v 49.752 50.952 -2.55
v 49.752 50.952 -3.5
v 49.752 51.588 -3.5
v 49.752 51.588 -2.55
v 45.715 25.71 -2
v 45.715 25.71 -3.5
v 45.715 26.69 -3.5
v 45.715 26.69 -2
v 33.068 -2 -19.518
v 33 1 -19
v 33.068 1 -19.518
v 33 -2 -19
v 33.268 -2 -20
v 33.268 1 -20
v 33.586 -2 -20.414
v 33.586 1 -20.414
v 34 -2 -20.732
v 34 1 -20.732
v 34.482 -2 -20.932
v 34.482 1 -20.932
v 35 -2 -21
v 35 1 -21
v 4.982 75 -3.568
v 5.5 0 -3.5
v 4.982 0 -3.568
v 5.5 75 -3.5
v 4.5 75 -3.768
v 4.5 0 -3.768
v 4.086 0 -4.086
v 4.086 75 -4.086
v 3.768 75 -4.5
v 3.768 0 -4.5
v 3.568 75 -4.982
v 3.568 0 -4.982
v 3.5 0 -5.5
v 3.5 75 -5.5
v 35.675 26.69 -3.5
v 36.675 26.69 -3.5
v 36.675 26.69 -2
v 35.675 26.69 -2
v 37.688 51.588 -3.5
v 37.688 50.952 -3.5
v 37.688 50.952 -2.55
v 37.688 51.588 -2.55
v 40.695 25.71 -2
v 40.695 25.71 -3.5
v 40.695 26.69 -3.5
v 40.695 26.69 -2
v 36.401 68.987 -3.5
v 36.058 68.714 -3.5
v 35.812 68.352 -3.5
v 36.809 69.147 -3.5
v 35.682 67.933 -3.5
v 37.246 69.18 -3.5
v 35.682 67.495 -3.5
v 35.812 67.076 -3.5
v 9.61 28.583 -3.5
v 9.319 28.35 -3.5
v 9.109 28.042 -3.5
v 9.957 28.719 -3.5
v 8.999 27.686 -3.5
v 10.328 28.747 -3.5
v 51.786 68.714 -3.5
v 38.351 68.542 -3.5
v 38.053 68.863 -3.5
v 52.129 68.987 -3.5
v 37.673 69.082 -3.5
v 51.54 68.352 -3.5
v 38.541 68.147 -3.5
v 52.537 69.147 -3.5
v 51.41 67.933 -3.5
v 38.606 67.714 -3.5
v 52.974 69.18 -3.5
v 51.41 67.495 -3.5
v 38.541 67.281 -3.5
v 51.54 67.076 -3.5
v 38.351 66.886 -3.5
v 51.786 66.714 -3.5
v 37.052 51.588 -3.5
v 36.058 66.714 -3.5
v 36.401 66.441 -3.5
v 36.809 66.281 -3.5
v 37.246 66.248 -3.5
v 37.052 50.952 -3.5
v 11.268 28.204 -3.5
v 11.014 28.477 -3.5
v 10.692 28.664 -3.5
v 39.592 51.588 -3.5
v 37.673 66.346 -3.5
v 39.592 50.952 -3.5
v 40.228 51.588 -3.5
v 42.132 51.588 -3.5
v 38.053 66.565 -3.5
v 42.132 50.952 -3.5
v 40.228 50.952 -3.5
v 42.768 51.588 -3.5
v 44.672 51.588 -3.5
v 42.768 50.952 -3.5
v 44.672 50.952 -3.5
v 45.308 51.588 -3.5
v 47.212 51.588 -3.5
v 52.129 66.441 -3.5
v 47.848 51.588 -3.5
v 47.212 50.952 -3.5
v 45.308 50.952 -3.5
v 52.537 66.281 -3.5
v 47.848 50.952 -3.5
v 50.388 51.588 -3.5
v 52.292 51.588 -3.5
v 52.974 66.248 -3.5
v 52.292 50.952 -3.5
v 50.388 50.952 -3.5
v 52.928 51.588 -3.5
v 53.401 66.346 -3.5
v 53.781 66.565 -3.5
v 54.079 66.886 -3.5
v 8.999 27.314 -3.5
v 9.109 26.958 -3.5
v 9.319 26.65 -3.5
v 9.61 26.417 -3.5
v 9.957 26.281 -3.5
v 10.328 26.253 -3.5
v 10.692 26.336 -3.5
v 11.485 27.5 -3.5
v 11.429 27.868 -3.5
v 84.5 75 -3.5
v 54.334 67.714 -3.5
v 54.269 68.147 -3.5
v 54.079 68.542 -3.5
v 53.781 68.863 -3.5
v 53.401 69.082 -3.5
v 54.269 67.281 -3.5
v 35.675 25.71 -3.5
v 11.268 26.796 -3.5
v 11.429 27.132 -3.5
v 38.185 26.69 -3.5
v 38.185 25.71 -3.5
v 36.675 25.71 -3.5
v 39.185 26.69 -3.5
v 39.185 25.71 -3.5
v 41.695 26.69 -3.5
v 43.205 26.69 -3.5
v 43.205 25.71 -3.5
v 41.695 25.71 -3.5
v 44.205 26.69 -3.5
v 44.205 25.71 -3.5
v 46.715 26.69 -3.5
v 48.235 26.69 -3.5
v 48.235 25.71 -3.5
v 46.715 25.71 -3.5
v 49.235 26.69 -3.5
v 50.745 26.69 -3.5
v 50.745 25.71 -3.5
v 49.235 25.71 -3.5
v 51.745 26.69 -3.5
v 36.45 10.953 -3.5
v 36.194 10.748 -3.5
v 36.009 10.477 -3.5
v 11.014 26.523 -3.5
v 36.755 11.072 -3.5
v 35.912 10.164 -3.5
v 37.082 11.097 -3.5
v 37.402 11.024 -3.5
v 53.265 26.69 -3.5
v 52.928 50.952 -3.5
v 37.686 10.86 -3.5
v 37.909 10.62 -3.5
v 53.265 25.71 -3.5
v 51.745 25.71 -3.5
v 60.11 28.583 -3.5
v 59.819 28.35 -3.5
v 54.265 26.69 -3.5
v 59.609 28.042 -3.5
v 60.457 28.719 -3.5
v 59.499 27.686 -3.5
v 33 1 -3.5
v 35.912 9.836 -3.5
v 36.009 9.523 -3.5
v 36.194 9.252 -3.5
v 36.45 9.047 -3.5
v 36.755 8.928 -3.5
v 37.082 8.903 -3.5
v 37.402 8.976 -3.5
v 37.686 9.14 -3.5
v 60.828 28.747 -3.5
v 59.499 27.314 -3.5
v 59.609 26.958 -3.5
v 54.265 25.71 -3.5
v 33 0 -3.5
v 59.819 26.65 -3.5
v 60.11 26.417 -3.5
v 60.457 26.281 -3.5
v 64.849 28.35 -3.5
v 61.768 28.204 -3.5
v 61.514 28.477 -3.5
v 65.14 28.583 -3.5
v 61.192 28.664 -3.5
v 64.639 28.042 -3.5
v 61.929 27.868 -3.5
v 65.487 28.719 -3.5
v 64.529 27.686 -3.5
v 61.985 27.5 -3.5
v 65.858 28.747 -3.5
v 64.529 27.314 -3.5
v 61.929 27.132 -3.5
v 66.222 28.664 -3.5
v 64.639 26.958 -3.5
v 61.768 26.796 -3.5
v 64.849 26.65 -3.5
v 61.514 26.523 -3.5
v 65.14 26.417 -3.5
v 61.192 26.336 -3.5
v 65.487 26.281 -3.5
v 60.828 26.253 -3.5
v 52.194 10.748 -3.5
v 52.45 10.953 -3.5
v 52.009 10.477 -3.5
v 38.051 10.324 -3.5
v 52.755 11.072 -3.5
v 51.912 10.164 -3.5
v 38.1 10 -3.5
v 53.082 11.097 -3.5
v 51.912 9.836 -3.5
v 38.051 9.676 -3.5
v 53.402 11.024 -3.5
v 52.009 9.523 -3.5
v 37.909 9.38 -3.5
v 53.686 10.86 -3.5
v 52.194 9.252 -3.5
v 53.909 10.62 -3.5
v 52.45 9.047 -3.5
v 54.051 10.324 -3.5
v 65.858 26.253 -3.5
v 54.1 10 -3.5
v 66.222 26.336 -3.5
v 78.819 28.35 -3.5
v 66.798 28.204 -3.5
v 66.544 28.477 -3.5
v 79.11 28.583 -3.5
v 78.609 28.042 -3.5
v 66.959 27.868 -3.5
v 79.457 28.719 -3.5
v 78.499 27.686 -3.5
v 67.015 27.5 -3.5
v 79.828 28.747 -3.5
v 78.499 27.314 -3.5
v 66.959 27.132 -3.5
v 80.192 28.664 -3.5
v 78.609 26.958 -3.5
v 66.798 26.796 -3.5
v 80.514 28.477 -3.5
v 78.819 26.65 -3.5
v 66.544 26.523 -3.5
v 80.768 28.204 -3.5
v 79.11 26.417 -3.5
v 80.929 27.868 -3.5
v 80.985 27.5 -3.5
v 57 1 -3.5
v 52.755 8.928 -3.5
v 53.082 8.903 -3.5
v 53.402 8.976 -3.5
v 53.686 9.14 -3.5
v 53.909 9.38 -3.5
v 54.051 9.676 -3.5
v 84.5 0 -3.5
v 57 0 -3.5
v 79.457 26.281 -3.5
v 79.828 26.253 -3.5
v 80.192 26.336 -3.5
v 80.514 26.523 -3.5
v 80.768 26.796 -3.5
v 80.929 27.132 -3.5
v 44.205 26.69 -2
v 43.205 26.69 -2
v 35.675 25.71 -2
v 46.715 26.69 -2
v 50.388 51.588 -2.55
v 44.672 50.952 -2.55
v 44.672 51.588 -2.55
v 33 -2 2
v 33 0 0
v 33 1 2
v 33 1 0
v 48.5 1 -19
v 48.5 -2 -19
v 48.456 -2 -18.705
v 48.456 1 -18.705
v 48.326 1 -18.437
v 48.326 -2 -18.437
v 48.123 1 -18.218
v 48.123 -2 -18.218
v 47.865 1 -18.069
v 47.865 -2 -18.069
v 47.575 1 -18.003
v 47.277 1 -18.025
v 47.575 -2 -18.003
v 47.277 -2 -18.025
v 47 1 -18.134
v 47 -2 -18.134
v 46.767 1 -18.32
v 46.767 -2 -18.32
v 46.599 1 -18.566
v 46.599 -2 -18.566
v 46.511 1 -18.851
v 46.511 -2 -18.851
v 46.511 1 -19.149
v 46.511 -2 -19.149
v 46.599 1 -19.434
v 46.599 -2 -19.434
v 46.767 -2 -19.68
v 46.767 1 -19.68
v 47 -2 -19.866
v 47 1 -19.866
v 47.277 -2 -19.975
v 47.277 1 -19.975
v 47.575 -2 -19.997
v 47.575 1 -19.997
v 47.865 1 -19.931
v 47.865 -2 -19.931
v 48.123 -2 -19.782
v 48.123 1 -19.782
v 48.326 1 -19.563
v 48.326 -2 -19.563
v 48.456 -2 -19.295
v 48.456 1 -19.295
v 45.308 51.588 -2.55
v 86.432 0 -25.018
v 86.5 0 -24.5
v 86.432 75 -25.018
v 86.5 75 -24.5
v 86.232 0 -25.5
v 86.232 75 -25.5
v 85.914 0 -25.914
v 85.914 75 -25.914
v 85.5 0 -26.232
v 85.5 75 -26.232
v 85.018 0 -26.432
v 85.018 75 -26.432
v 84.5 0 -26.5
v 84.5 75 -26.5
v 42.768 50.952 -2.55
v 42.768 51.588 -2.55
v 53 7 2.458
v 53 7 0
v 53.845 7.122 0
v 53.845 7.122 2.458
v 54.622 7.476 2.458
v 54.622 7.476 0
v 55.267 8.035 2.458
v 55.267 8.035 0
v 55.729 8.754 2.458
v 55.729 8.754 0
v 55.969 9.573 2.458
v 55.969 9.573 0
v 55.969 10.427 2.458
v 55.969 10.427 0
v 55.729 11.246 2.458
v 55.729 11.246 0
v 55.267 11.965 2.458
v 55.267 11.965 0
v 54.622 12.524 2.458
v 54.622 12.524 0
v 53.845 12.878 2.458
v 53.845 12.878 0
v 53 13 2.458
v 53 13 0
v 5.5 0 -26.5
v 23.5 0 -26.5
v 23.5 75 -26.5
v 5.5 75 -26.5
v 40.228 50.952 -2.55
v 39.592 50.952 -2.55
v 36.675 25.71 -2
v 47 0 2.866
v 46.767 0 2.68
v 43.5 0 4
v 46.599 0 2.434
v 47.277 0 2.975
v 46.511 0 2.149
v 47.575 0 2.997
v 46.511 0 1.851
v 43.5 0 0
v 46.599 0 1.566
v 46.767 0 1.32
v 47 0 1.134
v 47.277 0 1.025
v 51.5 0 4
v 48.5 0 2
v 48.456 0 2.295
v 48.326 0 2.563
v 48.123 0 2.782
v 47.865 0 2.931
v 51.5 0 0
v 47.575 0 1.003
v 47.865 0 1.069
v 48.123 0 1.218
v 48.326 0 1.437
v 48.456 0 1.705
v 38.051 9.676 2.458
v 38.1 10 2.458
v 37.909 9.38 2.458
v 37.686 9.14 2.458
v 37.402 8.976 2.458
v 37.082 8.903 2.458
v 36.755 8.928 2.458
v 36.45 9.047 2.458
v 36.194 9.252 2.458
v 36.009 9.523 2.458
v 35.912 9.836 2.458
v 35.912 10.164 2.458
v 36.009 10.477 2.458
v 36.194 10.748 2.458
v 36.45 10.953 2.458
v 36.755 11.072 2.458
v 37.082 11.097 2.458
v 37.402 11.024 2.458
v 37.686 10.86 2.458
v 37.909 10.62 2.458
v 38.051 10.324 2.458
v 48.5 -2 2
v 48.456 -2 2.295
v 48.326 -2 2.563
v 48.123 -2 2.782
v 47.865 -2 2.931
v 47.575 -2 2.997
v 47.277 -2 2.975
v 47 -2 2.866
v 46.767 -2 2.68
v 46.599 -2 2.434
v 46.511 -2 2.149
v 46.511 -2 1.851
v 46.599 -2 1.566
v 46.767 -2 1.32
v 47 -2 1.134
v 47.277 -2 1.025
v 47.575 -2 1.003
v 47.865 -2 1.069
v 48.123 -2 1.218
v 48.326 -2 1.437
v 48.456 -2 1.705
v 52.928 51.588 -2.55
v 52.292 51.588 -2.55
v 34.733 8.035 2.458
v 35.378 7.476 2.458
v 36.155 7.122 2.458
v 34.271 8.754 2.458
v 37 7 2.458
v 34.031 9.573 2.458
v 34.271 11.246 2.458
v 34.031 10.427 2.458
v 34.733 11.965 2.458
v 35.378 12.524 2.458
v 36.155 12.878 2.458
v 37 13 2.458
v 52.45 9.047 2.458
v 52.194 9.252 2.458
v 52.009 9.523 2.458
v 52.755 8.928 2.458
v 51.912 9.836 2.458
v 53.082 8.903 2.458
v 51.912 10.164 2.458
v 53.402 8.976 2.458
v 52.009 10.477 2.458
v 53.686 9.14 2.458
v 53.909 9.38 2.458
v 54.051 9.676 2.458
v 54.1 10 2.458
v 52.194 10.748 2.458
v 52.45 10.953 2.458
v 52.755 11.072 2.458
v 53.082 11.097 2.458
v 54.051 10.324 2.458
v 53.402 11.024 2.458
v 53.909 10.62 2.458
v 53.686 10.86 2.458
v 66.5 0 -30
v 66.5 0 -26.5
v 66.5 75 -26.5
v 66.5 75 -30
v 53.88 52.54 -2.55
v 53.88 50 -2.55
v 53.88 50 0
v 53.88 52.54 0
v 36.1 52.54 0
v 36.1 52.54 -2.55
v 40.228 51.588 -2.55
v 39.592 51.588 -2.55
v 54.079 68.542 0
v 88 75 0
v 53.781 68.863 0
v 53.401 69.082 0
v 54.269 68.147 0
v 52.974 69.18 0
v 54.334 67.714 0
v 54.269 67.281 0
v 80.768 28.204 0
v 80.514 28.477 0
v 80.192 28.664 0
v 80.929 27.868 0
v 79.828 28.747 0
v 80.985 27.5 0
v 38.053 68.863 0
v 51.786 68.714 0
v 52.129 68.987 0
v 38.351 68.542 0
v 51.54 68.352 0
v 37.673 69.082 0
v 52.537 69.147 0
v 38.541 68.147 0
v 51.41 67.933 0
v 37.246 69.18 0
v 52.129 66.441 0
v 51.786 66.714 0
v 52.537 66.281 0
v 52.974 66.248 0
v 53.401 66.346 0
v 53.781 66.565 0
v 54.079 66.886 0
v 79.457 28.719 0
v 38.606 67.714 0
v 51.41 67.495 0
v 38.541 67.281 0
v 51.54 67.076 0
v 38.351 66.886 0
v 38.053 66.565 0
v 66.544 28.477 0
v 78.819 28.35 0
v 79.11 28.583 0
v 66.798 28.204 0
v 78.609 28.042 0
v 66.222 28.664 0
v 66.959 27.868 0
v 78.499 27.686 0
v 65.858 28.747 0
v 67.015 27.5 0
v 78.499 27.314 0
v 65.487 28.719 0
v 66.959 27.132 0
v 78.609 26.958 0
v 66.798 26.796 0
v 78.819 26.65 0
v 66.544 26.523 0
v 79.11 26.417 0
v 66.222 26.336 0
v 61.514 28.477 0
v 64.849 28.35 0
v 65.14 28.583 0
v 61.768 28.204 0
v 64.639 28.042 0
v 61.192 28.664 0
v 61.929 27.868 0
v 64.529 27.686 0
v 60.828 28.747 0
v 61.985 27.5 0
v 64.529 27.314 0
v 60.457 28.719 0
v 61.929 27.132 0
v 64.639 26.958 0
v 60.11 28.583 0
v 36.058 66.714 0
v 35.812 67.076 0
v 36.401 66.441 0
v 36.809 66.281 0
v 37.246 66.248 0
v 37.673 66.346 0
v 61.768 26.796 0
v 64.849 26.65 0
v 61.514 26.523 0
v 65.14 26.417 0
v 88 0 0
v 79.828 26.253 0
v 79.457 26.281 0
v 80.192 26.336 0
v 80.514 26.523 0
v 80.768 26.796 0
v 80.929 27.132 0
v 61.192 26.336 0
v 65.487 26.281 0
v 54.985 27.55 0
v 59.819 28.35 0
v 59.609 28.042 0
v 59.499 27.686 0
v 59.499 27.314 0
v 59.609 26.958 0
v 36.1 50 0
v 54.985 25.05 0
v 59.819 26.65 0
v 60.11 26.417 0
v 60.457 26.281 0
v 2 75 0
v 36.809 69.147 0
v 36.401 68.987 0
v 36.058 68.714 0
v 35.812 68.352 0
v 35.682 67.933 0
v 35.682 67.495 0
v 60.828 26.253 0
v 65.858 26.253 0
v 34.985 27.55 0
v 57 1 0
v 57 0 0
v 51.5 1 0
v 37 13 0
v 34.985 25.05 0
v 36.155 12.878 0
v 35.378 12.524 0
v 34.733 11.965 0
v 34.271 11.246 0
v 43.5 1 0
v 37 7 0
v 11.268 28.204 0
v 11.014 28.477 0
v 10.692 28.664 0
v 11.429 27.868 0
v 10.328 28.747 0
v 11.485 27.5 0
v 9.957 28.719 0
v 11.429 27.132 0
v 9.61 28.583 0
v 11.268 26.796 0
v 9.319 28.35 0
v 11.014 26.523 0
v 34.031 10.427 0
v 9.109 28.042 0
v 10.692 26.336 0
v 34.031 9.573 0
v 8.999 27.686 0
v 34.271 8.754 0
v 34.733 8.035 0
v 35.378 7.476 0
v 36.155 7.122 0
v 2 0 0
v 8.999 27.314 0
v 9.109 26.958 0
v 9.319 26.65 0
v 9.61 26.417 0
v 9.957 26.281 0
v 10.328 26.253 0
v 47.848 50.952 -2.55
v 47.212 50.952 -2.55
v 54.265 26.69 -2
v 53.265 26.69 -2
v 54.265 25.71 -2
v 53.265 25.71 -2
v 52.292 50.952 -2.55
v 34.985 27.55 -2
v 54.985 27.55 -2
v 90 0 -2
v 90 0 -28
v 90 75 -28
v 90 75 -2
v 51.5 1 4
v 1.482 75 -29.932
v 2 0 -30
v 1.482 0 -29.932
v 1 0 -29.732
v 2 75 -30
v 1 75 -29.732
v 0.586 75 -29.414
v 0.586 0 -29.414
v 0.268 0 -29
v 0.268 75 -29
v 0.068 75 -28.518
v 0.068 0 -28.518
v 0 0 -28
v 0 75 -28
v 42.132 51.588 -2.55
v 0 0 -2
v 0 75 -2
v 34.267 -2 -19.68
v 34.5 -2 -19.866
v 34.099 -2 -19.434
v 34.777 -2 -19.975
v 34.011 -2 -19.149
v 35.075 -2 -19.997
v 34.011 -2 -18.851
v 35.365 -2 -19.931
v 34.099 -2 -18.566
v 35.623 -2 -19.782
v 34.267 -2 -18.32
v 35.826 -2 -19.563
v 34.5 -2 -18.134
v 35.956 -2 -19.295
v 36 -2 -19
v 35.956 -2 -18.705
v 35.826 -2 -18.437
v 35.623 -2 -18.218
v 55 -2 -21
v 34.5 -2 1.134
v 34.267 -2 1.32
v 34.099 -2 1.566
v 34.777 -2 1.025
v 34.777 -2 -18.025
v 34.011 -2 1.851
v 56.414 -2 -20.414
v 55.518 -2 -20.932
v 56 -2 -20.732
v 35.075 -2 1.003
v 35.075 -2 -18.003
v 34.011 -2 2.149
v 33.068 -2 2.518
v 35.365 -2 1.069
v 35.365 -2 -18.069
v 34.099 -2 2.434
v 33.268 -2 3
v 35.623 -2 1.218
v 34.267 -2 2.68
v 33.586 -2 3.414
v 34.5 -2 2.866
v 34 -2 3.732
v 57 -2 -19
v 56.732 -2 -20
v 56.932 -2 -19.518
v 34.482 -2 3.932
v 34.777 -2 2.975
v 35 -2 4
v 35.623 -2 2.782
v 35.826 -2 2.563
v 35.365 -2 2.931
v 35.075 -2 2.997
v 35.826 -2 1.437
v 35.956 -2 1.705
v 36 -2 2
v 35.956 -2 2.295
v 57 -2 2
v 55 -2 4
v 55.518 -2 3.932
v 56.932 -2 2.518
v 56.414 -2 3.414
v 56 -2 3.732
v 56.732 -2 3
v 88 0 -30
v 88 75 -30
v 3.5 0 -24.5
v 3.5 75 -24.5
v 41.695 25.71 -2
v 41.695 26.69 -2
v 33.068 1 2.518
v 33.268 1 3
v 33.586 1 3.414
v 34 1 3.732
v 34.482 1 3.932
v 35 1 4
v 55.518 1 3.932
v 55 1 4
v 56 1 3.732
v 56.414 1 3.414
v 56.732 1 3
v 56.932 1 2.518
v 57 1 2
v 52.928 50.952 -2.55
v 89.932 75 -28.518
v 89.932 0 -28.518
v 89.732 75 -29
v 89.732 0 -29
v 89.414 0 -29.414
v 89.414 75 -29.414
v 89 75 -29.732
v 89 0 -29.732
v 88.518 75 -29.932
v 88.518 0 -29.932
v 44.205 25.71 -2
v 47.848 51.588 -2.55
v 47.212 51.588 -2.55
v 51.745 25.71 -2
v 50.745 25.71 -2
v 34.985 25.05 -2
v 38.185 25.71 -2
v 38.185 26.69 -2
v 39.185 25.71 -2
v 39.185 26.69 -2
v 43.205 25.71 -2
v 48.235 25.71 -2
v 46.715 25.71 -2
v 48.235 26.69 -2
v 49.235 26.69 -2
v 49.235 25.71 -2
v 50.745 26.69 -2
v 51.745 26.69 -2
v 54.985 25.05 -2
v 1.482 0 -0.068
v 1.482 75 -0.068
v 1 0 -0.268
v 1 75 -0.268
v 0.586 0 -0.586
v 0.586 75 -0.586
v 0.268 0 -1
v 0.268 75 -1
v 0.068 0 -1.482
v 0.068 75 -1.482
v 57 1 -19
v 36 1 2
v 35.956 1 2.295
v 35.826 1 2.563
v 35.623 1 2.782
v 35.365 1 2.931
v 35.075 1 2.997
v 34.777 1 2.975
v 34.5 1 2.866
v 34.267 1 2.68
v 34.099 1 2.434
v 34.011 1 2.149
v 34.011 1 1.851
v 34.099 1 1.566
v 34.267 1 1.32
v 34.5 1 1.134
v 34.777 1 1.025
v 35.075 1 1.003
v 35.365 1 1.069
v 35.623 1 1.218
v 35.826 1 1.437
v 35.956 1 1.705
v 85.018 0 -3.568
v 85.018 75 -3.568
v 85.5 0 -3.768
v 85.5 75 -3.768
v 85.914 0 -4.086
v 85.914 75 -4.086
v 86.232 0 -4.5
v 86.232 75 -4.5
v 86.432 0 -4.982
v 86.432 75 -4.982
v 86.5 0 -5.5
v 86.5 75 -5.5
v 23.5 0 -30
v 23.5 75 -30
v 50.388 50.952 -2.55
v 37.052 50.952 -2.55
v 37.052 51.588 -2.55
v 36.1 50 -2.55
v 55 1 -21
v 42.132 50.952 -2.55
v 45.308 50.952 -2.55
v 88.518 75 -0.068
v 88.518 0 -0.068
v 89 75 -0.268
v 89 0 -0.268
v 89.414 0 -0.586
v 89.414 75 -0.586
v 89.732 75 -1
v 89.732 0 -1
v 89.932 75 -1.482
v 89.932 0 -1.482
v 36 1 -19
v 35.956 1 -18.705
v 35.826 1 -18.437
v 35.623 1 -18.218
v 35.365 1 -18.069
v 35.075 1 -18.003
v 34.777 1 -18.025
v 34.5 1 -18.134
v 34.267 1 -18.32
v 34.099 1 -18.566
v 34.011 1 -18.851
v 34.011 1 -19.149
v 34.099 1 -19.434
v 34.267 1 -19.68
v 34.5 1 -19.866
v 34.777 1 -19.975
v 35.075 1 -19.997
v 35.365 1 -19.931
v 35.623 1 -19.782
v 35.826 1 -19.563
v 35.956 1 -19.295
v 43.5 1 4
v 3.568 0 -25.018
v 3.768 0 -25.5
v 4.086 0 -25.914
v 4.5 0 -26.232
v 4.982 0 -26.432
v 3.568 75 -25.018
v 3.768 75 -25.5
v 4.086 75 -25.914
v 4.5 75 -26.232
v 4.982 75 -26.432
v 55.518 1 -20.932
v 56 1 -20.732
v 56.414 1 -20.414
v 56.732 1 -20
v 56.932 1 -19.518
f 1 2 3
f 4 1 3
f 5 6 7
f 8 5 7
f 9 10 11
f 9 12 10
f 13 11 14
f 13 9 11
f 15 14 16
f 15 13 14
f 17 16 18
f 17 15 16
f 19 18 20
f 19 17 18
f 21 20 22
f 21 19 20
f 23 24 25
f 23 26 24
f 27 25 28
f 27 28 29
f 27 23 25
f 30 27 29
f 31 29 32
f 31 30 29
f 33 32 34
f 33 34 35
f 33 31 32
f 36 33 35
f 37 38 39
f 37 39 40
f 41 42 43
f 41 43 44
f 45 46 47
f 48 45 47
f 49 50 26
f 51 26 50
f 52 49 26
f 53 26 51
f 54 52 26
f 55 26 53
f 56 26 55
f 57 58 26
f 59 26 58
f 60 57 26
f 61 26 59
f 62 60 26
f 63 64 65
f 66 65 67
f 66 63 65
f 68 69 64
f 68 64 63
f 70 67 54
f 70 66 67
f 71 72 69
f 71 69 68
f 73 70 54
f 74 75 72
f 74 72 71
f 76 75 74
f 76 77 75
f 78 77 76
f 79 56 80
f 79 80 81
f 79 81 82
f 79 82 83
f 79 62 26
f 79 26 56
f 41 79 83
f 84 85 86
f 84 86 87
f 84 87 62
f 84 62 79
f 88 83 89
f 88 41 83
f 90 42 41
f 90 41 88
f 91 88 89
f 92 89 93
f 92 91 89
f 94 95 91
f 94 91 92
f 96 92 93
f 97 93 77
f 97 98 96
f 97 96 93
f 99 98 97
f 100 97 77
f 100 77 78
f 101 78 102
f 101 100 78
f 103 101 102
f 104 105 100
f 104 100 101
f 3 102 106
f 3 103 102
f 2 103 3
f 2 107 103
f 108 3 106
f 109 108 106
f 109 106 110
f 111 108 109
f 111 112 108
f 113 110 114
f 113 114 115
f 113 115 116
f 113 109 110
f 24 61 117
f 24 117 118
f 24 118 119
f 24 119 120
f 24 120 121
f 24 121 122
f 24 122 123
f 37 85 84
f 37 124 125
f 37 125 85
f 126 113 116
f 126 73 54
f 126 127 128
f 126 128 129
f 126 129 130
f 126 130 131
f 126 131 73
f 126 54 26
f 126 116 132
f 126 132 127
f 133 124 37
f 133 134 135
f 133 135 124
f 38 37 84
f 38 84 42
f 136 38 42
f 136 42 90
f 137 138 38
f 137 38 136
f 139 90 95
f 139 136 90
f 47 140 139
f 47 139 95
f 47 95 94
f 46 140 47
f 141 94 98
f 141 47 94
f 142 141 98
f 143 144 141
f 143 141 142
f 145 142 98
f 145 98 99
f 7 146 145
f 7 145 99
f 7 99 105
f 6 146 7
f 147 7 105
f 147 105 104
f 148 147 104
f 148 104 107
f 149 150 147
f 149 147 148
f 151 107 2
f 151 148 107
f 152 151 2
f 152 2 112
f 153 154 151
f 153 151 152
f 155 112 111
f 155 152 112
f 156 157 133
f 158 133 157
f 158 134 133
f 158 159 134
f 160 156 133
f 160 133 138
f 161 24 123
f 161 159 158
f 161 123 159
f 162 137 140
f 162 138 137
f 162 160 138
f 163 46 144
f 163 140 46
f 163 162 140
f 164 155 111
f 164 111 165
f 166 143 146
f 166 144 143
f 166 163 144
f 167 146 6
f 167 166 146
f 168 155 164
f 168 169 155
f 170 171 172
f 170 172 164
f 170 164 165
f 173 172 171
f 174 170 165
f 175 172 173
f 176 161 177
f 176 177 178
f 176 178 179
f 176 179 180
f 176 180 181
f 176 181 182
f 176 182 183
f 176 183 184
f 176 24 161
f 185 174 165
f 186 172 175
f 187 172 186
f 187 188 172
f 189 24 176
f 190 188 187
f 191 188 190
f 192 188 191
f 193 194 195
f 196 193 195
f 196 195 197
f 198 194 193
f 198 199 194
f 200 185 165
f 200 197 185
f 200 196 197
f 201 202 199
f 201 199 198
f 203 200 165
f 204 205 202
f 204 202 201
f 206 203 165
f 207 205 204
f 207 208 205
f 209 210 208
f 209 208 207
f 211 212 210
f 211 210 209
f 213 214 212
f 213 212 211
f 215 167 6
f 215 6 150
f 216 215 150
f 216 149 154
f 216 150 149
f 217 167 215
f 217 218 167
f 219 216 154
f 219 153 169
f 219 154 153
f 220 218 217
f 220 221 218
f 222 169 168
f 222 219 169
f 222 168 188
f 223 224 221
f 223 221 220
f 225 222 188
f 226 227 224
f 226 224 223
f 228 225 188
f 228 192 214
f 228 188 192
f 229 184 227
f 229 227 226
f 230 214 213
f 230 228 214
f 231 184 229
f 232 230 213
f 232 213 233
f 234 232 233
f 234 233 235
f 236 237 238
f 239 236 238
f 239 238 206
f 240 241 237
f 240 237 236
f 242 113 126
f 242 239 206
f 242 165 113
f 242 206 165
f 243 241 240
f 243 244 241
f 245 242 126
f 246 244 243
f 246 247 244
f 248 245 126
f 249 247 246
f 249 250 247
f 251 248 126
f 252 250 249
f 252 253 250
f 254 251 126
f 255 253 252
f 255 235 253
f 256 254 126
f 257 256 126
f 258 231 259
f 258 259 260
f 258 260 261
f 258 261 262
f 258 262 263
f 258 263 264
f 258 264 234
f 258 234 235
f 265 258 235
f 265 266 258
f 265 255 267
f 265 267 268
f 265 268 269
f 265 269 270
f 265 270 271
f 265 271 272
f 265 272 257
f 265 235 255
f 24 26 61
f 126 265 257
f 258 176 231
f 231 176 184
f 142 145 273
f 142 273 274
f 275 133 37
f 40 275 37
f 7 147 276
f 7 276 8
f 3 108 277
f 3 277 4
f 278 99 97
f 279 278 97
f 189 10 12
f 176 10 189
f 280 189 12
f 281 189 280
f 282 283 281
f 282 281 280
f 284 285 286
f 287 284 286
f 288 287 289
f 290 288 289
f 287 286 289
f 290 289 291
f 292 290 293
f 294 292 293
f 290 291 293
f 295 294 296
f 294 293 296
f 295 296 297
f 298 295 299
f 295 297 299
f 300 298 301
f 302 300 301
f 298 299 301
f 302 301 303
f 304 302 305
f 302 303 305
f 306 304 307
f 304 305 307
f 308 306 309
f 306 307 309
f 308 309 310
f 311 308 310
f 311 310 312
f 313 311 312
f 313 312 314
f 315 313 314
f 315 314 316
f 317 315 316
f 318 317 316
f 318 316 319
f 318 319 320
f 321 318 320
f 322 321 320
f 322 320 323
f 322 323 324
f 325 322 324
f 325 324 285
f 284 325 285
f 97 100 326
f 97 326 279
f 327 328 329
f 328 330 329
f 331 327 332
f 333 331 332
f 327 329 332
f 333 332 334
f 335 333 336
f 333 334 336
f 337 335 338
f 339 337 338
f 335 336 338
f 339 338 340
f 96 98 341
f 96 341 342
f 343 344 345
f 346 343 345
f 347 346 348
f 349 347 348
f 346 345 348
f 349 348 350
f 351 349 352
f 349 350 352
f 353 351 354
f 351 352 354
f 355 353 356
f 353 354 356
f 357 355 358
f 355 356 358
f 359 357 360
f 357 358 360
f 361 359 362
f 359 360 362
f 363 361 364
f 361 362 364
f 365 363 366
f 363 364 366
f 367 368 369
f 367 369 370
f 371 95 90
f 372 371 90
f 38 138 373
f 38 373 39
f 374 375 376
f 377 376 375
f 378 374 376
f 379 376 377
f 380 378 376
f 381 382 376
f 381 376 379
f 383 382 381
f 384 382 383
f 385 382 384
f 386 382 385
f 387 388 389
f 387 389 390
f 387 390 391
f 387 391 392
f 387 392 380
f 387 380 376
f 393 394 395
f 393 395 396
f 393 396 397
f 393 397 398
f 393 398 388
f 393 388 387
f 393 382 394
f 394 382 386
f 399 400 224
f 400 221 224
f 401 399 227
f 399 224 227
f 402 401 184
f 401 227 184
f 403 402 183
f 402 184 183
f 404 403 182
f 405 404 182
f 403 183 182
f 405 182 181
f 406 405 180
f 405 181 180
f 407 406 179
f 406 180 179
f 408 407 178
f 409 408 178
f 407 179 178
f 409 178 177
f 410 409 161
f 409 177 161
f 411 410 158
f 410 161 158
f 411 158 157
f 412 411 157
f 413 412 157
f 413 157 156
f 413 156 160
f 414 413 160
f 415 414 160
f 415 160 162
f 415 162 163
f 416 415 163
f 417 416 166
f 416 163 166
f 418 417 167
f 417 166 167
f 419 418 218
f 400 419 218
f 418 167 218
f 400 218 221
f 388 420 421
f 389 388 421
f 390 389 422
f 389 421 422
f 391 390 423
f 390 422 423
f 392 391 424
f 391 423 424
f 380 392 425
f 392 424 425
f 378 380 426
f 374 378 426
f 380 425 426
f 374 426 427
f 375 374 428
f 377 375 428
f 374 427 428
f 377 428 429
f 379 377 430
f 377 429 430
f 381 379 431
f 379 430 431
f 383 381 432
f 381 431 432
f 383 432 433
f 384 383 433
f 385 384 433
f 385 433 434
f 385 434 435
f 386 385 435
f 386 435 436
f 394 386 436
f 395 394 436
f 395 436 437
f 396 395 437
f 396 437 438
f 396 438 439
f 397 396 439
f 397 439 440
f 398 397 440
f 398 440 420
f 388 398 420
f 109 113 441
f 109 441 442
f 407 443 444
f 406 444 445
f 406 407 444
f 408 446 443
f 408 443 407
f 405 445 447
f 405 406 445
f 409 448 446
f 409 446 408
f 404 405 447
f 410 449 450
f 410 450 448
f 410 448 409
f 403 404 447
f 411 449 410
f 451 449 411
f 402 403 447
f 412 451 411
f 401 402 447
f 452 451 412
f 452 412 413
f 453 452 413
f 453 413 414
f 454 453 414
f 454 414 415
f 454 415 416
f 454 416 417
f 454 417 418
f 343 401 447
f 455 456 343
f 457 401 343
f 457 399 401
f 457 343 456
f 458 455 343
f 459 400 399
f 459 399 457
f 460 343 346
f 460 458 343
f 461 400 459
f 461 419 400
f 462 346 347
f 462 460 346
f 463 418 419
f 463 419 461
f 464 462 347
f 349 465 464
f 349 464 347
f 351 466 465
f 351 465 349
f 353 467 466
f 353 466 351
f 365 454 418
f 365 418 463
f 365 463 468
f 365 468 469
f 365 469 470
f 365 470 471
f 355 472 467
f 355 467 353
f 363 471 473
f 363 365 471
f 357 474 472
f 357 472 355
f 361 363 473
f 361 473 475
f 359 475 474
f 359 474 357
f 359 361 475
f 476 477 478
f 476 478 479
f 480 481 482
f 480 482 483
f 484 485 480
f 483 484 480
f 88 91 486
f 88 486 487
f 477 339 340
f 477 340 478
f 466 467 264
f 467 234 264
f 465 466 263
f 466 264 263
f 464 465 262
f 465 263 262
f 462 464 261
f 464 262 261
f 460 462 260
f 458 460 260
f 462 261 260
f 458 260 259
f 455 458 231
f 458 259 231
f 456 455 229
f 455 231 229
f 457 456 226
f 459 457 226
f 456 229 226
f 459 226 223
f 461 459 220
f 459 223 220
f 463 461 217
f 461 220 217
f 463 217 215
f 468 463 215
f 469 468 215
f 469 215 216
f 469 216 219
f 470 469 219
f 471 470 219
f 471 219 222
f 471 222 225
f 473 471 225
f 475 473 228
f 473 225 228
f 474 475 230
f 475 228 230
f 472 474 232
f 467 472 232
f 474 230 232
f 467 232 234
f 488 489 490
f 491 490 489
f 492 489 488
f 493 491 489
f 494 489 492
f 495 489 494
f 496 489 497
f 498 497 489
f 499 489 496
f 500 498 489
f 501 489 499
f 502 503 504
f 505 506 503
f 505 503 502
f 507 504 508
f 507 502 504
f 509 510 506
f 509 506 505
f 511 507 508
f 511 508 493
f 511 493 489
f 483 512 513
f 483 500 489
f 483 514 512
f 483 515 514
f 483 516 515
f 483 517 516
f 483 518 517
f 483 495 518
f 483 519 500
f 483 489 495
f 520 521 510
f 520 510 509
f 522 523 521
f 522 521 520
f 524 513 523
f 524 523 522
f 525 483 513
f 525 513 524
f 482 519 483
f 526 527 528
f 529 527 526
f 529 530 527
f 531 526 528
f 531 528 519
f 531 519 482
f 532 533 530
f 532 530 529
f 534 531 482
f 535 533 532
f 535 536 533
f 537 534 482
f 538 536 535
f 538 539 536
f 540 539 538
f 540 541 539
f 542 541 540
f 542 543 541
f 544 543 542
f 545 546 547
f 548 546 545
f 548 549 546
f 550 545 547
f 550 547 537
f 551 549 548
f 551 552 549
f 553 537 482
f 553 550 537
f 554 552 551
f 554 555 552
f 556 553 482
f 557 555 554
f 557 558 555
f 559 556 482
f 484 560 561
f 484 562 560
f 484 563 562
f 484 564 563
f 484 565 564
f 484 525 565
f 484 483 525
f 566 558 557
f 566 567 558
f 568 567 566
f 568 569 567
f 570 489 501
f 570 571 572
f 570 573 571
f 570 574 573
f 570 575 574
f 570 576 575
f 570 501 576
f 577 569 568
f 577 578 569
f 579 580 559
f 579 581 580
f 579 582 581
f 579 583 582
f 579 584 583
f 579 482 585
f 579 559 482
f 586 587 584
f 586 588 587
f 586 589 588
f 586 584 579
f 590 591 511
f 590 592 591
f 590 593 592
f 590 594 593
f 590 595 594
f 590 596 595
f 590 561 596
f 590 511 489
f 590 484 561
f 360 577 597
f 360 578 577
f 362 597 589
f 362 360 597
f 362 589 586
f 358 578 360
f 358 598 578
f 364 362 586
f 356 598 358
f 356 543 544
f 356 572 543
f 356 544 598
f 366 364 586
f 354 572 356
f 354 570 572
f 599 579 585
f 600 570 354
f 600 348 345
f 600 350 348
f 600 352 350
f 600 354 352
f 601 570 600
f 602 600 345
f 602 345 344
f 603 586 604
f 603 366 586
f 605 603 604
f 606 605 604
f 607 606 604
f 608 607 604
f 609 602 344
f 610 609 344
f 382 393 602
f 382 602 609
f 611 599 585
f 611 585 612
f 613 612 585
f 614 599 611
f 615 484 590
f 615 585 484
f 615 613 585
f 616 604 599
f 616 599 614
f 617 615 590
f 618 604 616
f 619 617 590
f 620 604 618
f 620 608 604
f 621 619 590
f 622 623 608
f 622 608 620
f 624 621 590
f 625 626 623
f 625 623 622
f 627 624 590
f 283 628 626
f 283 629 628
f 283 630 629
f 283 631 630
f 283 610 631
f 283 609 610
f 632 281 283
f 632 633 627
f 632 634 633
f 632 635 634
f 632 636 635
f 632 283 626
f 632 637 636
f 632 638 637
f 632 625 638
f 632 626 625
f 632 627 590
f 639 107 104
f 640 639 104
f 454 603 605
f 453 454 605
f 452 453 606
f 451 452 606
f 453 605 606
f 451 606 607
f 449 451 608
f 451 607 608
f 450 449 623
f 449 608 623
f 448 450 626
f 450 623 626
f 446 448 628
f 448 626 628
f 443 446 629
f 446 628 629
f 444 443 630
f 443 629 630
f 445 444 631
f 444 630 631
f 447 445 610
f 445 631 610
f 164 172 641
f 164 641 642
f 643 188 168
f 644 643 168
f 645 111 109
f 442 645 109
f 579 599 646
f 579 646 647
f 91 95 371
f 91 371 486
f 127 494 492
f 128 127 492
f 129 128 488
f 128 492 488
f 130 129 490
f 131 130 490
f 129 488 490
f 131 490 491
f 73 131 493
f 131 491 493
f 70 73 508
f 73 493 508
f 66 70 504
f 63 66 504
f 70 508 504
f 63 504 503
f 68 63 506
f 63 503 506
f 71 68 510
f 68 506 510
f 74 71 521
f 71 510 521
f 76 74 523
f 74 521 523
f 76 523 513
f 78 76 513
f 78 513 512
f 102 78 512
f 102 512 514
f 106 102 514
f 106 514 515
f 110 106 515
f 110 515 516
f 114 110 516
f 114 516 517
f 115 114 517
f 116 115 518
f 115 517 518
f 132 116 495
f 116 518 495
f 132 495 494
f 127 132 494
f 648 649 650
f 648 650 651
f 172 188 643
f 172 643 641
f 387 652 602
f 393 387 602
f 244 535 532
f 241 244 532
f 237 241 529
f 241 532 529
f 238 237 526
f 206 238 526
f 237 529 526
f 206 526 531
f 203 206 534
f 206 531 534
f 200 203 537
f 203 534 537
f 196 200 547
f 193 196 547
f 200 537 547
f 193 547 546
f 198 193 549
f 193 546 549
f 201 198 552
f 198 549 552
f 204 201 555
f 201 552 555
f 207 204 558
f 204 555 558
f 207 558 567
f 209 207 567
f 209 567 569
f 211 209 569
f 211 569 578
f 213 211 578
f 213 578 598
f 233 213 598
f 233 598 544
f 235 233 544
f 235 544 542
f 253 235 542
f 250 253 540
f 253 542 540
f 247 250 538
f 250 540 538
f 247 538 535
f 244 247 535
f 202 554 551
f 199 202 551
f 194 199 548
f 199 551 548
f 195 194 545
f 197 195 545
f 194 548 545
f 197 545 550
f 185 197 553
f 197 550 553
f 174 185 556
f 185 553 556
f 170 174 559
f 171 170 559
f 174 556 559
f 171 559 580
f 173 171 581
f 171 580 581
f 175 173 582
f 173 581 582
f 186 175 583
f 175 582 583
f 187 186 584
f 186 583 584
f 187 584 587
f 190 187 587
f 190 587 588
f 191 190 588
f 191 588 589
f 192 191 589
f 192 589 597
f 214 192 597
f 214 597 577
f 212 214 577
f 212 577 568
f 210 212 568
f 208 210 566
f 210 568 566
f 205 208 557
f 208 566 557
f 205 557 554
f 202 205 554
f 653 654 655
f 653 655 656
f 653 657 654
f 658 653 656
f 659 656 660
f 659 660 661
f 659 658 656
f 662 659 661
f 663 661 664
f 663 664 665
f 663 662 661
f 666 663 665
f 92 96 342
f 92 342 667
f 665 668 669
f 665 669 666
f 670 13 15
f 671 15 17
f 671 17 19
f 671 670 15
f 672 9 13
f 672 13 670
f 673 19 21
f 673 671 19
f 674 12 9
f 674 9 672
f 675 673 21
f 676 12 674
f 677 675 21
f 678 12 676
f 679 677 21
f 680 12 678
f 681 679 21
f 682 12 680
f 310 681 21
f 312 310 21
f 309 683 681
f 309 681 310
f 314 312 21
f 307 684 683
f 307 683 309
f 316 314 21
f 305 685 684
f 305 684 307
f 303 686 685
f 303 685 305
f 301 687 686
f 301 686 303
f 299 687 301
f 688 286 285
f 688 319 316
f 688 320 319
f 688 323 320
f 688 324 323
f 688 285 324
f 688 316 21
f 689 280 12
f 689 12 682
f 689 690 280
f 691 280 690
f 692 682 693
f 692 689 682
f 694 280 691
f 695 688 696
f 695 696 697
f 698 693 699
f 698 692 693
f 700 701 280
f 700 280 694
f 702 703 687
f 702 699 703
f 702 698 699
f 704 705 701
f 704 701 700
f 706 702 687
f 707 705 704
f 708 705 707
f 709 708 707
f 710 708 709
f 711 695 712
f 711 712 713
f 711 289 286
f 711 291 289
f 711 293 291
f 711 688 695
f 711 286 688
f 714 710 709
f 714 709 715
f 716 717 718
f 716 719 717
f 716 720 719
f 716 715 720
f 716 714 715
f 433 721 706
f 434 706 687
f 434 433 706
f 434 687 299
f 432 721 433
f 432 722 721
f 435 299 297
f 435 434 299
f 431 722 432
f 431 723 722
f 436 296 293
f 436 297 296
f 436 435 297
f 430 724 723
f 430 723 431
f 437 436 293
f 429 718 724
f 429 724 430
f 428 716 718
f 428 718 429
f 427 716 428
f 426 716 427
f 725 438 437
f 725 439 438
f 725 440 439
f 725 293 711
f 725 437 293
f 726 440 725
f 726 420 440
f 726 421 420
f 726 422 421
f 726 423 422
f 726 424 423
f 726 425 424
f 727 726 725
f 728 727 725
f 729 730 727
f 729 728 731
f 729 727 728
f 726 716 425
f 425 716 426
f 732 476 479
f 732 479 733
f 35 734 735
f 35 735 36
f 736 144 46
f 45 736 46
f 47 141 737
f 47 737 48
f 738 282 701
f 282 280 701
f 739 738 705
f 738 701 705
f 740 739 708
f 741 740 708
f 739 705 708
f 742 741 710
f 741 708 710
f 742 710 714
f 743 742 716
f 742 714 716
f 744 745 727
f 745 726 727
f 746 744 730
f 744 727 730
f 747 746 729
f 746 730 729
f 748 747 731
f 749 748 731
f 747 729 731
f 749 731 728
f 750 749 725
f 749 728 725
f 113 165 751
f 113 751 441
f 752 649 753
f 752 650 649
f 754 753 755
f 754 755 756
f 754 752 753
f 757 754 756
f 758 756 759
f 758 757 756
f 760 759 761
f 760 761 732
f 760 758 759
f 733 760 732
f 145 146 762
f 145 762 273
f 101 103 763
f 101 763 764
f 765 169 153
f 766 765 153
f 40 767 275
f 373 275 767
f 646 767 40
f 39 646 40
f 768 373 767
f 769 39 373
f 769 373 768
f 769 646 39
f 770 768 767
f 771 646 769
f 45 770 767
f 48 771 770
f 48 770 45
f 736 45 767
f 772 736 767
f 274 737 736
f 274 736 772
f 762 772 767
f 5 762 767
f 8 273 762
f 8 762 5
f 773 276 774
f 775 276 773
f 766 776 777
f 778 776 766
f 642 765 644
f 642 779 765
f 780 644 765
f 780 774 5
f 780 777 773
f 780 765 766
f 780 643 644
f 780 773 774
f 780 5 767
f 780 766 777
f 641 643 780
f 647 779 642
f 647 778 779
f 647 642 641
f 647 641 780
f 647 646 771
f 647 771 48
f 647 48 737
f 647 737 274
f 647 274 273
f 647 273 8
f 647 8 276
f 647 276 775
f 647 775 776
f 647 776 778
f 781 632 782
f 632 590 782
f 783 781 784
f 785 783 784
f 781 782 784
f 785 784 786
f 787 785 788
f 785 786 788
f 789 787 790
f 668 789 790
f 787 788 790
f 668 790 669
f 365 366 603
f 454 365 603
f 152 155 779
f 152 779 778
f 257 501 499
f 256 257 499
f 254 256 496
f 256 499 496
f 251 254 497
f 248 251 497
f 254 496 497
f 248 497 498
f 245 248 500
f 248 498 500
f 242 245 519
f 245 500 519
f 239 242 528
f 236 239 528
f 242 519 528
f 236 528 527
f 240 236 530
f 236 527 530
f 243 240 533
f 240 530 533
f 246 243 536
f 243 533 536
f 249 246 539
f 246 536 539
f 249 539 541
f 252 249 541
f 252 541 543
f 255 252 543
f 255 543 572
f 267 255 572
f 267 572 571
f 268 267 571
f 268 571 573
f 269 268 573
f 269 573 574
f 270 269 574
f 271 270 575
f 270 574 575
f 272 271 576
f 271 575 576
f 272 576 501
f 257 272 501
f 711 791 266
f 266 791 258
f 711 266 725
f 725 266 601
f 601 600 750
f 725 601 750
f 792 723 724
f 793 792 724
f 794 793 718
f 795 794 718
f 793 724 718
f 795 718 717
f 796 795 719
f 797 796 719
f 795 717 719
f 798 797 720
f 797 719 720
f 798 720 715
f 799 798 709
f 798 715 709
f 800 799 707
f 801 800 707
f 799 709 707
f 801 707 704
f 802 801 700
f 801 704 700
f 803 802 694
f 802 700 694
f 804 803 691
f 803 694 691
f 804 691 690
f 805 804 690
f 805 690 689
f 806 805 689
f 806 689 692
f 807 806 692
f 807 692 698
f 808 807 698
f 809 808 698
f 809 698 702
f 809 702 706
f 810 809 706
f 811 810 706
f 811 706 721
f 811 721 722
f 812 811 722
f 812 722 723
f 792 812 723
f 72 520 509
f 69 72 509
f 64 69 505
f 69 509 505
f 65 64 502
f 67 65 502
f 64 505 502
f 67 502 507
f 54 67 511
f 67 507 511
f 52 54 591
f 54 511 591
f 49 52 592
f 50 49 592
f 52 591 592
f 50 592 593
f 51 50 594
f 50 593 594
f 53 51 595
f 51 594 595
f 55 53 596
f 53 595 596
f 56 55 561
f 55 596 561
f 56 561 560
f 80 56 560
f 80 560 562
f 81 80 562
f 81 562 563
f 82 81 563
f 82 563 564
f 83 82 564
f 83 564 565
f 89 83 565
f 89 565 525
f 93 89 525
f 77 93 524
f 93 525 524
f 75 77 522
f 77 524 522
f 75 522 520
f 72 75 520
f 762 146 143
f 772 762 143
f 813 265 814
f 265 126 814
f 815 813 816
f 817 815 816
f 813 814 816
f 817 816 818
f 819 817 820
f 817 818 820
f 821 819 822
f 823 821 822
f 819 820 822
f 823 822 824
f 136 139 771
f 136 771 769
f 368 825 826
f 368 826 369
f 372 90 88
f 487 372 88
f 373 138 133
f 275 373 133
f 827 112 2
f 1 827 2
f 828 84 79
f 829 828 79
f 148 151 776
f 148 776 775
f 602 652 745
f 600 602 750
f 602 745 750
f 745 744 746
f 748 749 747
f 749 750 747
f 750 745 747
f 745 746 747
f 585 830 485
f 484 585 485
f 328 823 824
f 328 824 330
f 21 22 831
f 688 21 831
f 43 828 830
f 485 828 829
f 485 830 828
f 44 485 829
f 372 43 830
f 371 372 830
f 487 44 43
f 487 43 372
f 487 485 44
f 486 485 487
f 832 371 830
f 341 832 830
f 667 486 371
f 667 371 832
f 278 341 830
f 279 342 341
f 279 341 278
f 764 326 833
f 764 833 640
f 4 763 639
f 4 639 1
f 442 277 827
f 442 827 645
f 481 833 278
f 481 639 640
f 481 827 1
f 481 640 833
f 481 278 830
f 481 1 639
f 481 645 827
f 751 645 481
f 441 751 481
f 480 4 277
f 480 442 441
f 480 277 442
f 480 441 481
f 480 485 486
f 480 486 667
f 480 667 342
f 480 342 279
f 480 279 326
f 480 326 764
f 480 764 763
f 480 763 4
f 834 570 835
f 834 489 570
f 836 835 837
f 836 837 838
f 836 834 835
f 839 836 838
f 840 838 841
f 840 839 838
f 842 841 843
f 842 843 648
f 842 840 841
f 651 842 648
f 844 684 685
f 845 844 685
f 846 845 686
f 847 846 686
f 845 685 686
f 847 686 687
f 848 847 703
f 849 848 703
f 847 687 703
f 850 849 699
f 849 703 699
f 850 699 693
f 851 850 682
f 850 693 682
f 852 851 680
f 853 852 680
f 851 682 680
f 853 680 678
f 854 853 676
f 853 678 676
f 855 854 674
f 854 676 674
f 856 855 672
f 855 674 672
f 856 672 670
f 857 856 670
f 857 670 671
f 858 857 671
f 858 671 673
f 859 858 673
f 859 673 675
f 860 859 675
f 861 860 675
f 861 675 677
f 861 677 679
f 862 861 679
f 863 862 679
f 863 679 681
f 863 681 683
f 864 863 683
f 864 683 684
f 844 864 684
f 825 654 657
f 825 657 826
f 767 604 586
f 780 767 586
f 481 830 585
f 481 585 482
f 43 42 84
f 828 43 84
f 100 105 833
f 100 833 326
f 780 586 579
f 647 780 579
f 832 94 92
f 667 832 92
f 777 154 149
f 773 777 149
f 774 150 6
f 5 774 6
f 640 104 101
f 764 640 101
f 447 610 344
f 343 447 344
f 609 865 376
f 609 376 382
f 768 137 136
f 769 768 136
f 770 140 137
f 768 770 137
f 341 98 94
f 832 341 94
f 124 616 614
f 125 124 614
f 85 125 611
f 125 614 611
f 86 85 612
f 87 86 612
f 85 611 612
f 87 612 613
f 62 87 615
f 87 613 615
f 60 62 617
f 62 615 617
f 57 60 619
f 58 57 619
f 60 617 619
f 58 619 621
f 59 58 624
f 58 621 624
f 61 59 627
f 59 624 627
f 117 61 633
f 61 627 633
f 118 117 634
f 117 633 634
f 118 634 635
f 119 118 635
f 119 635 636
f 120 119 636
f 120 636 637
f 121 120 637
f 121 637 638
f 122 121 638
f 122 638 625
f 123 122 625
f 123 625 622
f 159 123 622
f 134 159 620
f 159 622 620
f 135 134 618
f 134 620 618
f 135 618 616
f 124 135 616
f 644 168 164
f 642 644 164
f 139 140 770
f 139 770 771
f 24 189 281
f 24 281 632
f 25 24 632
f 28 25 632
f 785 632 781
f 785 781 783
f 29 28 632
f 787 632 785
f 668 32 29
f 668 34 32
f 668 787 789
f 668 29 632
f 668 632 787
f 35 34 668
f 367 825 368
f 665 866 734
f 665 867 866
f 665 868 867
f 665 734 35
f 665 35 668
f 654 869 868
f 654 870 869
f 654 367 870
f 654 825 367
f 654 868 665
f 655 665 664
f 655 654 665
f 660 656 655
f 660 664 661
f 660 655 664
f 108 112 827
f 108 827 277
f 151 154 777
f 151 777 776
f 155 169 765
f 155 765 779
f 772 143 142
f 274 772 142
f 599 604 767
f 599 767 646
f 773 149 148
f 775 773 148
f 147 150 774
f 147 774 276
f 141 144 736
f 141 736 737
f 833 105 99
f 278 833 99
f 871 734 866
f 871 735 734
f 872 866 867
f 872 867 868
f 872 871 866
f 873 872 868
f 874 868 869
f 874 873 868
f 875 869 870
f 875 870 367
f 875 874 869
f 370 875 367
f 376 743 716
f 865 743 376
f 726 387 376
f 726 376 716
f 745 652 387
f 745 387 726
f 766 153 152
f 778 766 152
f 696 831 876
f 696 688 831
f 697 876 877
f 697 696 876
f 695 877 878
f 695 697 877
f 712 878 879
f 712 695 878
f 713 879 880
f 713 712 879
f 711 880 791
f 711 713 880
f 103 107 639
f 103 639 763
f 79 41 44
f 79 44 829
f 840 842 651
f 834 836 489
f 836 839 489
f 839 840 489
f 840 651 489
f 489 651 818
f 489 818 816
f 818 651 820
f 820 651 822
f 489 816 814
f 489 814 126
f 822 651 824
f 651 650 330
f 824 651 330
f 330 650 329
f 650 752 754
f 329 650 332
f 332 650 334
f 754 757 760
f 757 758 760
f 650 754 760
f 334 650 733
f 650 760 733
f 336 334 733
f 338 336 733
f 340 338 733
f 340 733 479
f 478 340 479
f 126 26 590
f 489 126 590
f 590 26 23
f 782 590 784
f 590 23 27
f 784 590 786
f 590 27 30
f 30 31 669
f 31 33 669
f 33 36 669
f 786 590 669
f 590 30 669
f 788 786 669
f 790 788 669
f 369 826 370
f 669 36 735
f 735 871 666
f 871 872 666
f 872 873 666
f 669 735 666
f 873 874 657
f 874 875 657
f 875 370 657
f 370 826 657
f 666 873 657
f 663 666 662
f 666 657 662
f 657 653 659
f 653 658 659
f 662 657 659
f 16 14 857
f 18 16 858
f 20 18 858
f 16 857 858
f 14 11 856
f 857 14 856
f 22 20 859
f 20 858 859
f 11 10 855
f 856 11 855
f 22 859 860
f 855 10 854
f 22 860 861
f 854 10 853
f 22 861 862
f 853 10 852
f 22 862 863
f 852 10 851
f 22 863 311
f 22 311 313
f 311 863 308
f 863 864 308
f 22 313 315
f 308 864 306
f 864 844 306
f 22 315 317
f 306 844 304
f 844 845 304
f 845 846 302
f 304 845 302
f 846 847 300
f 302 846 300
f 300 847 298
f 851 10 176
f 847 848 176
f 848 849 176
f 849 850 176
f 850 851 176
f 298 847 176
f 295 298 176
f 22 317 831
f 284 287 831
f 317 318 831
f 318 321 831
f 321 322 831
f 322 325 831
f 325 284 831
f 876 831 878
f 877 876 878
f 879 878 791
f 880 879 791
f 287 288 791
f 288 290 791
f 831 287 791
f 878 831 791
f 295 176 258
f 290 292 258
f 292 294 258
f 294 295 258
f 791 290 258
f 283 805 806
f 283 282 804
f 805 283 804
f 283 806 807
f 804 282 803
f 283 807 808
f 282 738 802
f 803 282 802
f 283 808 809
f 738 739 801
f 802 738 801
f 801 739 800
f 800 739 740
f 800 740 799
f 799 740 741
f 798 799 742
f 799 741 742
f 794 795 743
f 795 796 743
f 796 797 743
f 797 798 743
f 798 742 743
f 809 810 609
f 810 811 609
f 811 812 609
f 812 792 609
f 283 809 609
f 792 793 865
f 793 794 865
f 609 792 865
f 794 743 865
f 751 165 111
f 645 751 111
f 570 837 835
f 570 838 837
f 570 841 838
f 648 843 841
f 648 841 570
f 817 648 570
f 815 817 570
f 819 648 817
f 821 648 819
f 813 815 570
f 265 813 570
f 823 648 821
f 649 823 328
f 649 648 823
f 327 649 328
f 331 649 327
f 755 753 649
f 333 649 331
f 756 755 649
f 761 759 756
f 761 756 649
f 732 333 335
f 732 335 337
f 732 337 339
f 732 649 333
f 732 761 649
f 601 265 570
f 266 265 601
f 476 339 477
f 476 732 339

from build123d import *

# Parameters (mm, degrees)
BOSS_EXTRUDE1_DEPTH      = 75
SKETCH2_R                = 1.1
CUT_EXTRUDE1_DEPTH       = 121.933866224
BOSS_EXTRUDE2_DEPTH      = 2.458497378
SKETCH4_R                = 1.1
CUT_EXTRUDE2_DEPTH       = 121.933866224
SKETCH5_W                = 20
SKETCH5_H                = 2.5
CUT_EXTRUDE3_DEPTH       = 2
CUT_EXTRUDE4_DEPTH       = 121.933866224
CUT_EXTRUDE4_DEPTH_BACK  = 2.55
SKETCH6_W                = 17.78
SKETCH6_H                = 2.54
SKETCH7_W                = 1
SKETCH7_H                = 0.979795898
CUT_EXTRUDE5_DEPTH       = 121.113488002
SKETCH8_W                = 0.635
SKETCH8_H                = 0.635
CUT_EXTRUDE6_DEPTH       = 121.113488002
BOSS_EXTRUDE3_DEPTH      = 2
BOSS_EXTRUDE3_DEPTH_BACK = 1
SKETCH9_W                = 24
SKETCH9_H                = 25
FILLET1_R                = 2
SKETCH10_R               = 1
CUT_EXTRUDE7_DEPTH       = 4
SKETCH11_W               = 8
SKETCH11_H               = 4
CUT_EXTRUDE8_DEPTH       = 1
FILLET2_R                = 2
SKETCH12_R               = 1.25
SKETCH12_R_2             = 1.47
CUT_EXTRUDE10_DEPTH      = 3.5


with BuildPart() as part:
    # Sketch1 → Boss-Extrude1 (new body)
    with BuildSketch(Plane(origin=(0, 0, 0), x_dir=(1, 0, 0), z_dir=(0, 1, 0))):
        Polygon((23.5, 30), (23.5, 26.5), (3.5, 26.5), (3.5, 3.5), (86.5, 3.5), (86.5, 26.5), (66.5, 26.5), (66.5, 30), (90, 30), (90, 0), (0, 0), (0, 30), align=None)
    extrude(amount=BOSS_EXTRUDE1_DEPTH)

    # Sketch2 → Cut-Extrude1 (cut, through all)
    with BuildSketch(Plane.XY):
        with Locations((53, 10)):
            Circle(SKETCH2_R)
        with Locations((37, 10)):
            Circle(SKETCH2_R)
    extrude(amount=-CUT_EXTRUDE1_DEPTH, mode=Mode.SUBTRACT)

    # Sketch3 → Boss-Extrude2 (add)
    with BuildSketch(Plane.XY):
        with BuildLine():
            Line((53, 13), (37, 13))
            ThreePointArc((37, 13), (34, 10), (37, 7))
            Line((37, 7), (53, 7))
            ThreePointArc((53, 7), (56, 10), (53, 13))
        make_face()
    extrude(amount=BOSS_EXTRUDE2_DEPTH)

    # Sketch4 → Cut-Extrude2 (cut, through all)
    with BuildSketch(Plane(origin=(0, 0, 0), x_dir=(-1, 0, 0), z_dir=(0, 0, -1))):
        with Locations(Location((-37, 10, 0), (0, 0, 180))):
            Circle(SKETCH4_R)
        with Locations(Location((-53, 10, 0), (0, 0, 180))):
            Circle(SKETCH4_R)
    extrude(amount=-CUT_EXTRUDE2_DEPTH, mode=Mode.SUBTRACT)

    # Sketch5 → Cut-Extrude3 (cut)
    with BuildSketch(Plane.XY):
        with Locations((44.985, 26.3)):
            Rectangle(SKETCH5_W, SKETCH5_H)
    extrude(amount=-CUT_EXTRUDE3_DEPTH, mode=Mode.SUBTRACT)

    # Sketch6 → Cut-Extrude4 (cut, two sides: drawn at the far end of the back side and taken through both)
    with BuildSketch(Plane.XY.offset(-CUT_EXTRUDE4_DEPTH_BACK)):
        with Locations((44.99, 51.27)):
            Rectangle(SKETCH6_W, SKETCH6_H)
    extrude(amount=CUT_EXTRUDE4_DEPTH + CUT_EXTRUDE4_DEPTH_BACK, mode=Mode.SUBTRACT)

    # Sketch7 → Cut-Extrude5 (cut, through all)
    with BuildSketch(Plane(origin=(0, 0, -3.5), x_dir=(-1, 0, 0), z_dir=(0, 0, -1))):
        with Locations((-53.765, 26.2)):
            Rectangle(SKETCH7_W, SKETCH7_H)
        with Locations((-51.245, 26.2)):
            Rectangle(SKETCH7_W, SKETCH7_H)
        with Locations((-48.735, 26.2)):
            Rectangle(SKETCH7_W, SKETCH7_H)
        with Locations((-46.215, 26.2)):
            Rectangle(SKETCH7_W, SKETCH7_H)
        with Locations((-43.705, 26.2)):
            Rectangle(SKETCH7_W, SKETCH7_H)
        with Locations((-41.195, 26.2)):
            Rectangle(SKETCH7_W, SKETCH7_H)
        with Locations((-38.685, 26.2)):
            Rectangle(SKETCH7_W, SKETCH7_H)
        with Locations((-36.175, 26.2)):
            Rectangle(SKETCH7_W, SKETCH7_H)
    extrude(amount=-CUT_EXTRUDE5_DEPTH, mode=Mode.SUBTRACT)

    # Sketch8 → Cut-Extrude6 (cut, through all)
    with BuildSketch(Plane(origin=(0, 0, -3.5), x_dir=(-1, 0, 0), z_dir=(0, 0, -1))):
        with Locations((-52.61, 51.27)):
            Rectangle(SKETCH8_W, SKETCH8_H)
        with Locations((-50.07, 51.27)):
            Rectangle(SKETCH8_W, SKETCH8_H)
        with Locations((-47.53, 51.27)):
            Rectangle(SKETCH8_W, SKETCH8_H)
        with Locations((-44.99, 51.27)):
            Rectangle(SKETCH8_W, SKETCH8_H)
        with Locations((-42.45, 51.27)):
            Rectangle(SKETCH8_W, SKETCH8_H)
        with Locations((-39.91, 51.27)):
            Rectangle(SKETCH8_W, SKETCH8_H)
        with Locations((-37.37, 51.27)):
            Rectangle(SKETCH8_W, SKETCH8_H)
    extrude(amount=-CUT_EXTRUDE6_DEPTH, mode=Mode.SUBTRACT)

    # Sketch9 → Boss-Extrude3 (add, two sides: drawn at the far end of the back side and taken through both)
    with BuildSketch(Plane.XZ.offset(-BOSS_EXTRUDE3_DEPTH_BACK)):
        with Locations((45, -8.5)):
            Rectangle(SKETCH9_W, SKETCH9_H)
    extrude(amount=BOSS_EXTRUDE3_DEPTH + BOSS_EXTRUDE3_DEPTH_BACK)

    # Fillet1
    fillet1_edges = [part.edges().sort_by_distance(p)[0] for p in [
        (57, -0.5, 4),
        (33, -0.5, -21),
        (57, -0.5, -21),
        (33, -0.5, 4),
    ]]
    fillet(fillet1_edges, radius=FILLET1_R)

    # Sketch10 → Cut-Extrude7 (cut)
    with BuildSketch(Plane.XZ.offset(2)):
        with Locations((47.5, -19)):
            Circle(SKETCH10_R)
        with Locations((35, -19)):
            Circle(SKETCH10_R)
        with Locations((47.5, 2)):
            Circle(SKETCH10_R)
        with Locations((35, 2)):
            Circle(SKETCH10_R)
    extrude(amount=-CUT_EXTRUDE7_DEPTH, mode=Mode.SUBTRACT)

    # Sketch11 → Cut-Extrude8 (cut)
    with BuildSketch(Plane(origin=(0, 1, 0), x_dir=(1, 0, 0), z_dir=(0, 1, 0))):
        with Locations((47.5, -2)):
            Rectangle(SKETCH11_W, SKETCH11_H)
    extrude(amount=-CUT_EXTRUDE8_DEPTH, mode=Mode.SUBTRACT)

    # Fillet2
    fillet2_edges = [part.edges().sort_by_distance(p)[0] for p in [
        (0, 37.5, -30),
        (3.5, 37.5, -26.5),
        (3.5, 37.5, -3.5),
        (86.5, 37.5, -3.5),
        (86.5, 37.5, -26.5),
        (90, 37.5, -30),
        (90, 37.5, 0),
        (0, 37.5, 0),
    ]]
    fillet(fillet2_edges, radius=FILLET2_R)

    # Sketch12 → Cut-Extrude10 (cut)
    with BuildSketch(Plane.XY):
        with Locations((79.735, 27.5)):
            Circle(SKETCH12_R)
        with Locations((65.765, 27.5)):
            Circle(SKETCH12_R)
        with Locations((60.735, 27.5)):
            Circle(SKETCH12_R)
        with Locations((10.235, 27.5)):
            Circle(SKETCH12_R)
        with Locations((52.864, 67.714)):
            Circle(SKETCH12_R_2)
        with Locations((37.136, 67.714)):
            Circle(SKETCH12_R_2)
    extrude(amount=-CUT_EXTRUDE10_DEPTH, mode=Mode.SUBTRACT)


solid = part.part
